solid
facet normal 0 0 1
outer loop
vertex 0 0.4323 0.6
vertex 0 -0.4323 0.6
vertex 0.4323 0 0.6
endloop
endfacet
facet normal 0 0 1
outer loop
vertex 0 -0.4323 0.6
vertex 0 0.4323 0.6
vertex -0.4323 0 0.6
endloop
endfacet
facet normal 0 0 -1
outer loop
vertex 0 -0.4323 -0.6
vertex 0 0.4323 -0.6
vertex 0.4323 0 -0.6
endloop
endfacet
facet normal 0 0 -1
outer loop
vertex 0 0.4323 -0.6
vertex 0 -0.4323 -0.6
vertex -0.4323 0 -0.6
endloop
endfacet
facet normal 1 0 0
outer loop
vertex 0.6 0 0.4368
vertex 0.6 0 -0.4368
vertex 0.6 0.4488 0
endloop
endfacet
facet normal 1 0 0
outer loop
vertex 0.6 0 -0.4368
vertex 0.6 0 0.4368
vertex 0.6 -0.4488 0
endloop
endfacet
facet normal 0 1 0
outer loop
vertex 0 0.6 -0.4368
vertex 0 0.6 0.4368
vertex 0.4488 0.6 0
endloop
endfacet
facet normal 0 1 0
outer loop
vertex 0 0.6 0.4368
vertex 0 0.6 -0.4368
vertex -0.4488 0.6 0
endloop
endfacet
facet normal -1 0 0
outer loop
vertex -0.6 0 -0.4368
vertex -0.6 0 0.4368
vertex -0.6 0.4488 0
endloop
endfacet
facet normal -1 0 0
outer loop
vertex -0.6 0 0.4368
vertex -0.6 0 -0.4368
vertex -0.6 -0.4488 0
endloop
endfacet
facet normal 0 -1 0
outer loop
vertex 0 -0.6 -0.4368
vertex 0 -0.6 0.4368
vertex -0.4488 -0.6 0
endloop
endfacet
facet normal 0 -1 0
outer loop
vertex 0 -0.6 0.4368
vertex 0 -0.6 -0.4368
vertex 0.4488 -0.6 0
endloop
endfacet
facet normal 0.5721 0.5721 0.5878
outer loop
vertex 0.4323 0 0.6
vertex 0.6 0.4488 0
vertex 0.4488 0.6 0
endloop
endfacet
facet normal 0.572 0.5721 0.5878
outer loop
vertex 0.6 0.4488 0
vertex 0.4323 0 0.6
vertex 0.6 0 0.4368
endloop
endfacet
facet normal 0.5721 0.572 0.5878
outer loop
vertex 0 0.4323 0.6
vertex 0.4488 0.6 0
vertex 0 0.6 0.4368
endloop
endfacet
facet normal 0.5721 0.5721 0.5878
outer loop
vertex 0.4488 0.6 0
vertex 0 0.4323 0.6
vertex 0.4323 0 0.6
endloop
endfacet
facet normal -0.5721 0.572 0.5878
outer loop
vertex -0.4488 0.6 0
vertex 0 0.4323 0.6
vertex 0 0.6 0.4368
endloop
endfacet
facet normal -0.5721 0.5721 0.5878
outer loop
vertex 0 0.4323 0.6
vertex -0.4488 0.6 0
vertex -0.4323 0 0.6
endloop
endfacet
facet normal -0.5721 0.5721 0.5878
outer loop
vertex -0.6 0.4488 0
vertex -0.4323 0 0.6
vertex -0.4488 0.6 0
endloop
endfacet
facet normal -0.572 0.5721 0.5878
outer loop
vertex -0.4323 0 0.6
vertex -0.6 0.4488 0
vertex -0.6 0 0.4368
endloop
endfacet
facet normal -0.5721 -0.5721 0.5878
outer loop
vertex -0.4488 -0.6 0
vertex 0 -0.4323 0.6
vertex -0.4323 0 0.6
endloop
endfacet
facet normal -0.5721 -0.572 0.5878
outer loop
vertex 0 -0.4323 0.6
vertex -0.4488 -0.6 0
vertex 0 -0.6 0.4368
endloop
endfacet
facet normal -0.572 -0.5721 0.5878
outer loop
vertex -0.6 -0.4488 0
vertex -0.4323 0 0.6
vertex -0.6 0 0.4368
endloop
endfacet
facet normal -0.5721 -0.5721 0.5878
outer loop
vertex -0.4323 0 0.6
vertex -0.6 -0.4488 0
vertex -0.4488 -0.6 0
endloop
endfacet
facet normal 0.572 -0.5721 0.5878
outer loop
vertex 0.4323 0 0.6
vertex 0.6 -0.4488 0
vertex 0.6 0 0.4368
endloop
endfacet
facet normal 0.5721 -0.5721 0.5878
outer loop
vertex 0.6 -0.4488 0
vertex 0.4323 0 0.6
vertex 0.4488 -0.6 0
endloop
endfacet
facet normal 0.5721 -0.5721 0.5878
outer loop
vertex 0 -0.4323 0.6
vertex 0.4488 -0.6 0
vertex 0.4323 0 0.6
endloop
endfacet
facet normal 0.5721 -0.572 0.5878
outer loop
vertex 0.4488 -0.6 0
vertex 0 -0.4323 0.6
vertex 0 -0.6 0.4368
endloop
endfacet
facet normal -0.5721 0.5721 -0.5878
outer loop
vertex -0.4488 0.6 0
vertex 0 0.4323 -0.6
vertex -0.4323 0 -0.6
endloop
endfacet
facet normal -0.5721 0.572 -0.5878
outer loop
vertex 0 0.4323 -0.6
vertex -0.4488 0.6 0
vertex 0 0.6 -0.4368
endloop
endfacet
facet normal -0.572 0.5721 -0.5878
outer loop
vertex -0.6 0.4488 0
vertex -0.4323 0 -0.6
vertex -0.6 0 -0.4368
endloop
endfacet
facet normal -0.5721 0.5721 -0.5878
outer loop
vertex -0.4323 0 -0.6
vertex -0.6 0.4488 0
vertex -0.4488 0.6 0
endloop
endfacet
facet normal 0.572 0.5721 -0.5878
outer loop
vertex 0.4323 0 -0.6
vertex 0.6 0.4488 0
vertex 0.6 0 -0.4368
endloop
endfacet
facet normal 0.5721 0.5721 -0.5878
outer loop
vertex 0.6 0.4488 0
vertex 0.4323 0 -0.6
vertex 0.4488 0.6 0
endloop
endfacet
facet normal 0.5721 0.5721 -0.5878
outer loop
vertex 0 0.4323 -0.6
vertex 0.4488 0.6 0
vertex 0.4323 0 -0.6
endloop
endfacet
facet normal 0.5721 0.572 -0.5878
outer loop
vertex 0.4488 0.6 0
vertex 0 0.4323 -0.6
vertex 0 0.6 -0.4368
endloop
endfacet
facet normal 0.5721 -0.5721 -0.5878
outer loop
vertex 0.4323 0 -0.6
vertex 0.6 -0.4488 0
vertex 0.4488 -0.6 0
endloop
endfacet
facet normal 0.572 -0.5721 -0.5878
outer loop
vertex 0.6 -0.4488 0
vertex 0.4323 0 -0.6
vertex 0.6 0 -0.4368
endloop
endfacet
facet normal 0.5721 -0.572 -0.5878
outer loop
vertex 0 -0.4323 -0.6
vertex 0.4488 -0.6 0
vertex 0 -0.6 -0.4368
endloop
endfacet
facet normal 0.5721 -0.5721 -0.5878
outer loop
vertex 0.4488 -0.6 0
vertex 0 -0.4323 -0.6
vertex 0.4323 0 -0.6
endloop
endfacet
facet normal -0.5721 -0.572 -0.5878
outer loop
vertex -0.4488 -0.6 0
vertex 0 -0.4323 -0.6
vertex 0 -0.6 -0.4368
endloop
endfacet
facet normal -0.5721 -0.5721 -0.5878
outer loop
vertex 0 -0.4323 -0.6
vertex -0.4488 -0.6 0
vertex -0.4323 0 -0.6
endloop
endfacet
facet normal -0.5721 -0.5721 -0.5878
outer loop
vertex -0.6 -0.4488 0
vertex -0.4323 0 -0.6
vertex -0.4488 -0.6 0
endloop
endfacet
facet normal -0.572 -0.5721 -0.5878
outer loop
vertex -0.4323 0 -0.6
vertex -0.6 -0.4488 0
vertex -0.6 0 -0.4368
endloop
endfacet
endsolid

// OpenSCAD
s = 2;
p = 0.20;

module draw_cube() {
  translate([ 0, 0, s - s*p])
    cube(s, true);
}

difference() {
  sphere($fn = 100, d = s);
  
  // Cut the top and bottom first.
  for(i = [0:1]) {
    rotate(i * 180, [1, 0, 0])
      draw_cube();
  }
  
  // Cut the sides off next.
  for(i = [0:90:270]) {
    rotate(i, [0, 0, 1])
      rotate(90, [0, 1, 0])
        draw_cube();
  }
  
  // Cut the corners off.
  for(j = [0:1])
    for(i = [0:3])
      rotate(j*180, [0, 1, 0])
        rotate(45+i*90, [0, 0, 1])
          rotate(54, [0, 1, 0])
            draw_cube();
}

//draw_cube();
